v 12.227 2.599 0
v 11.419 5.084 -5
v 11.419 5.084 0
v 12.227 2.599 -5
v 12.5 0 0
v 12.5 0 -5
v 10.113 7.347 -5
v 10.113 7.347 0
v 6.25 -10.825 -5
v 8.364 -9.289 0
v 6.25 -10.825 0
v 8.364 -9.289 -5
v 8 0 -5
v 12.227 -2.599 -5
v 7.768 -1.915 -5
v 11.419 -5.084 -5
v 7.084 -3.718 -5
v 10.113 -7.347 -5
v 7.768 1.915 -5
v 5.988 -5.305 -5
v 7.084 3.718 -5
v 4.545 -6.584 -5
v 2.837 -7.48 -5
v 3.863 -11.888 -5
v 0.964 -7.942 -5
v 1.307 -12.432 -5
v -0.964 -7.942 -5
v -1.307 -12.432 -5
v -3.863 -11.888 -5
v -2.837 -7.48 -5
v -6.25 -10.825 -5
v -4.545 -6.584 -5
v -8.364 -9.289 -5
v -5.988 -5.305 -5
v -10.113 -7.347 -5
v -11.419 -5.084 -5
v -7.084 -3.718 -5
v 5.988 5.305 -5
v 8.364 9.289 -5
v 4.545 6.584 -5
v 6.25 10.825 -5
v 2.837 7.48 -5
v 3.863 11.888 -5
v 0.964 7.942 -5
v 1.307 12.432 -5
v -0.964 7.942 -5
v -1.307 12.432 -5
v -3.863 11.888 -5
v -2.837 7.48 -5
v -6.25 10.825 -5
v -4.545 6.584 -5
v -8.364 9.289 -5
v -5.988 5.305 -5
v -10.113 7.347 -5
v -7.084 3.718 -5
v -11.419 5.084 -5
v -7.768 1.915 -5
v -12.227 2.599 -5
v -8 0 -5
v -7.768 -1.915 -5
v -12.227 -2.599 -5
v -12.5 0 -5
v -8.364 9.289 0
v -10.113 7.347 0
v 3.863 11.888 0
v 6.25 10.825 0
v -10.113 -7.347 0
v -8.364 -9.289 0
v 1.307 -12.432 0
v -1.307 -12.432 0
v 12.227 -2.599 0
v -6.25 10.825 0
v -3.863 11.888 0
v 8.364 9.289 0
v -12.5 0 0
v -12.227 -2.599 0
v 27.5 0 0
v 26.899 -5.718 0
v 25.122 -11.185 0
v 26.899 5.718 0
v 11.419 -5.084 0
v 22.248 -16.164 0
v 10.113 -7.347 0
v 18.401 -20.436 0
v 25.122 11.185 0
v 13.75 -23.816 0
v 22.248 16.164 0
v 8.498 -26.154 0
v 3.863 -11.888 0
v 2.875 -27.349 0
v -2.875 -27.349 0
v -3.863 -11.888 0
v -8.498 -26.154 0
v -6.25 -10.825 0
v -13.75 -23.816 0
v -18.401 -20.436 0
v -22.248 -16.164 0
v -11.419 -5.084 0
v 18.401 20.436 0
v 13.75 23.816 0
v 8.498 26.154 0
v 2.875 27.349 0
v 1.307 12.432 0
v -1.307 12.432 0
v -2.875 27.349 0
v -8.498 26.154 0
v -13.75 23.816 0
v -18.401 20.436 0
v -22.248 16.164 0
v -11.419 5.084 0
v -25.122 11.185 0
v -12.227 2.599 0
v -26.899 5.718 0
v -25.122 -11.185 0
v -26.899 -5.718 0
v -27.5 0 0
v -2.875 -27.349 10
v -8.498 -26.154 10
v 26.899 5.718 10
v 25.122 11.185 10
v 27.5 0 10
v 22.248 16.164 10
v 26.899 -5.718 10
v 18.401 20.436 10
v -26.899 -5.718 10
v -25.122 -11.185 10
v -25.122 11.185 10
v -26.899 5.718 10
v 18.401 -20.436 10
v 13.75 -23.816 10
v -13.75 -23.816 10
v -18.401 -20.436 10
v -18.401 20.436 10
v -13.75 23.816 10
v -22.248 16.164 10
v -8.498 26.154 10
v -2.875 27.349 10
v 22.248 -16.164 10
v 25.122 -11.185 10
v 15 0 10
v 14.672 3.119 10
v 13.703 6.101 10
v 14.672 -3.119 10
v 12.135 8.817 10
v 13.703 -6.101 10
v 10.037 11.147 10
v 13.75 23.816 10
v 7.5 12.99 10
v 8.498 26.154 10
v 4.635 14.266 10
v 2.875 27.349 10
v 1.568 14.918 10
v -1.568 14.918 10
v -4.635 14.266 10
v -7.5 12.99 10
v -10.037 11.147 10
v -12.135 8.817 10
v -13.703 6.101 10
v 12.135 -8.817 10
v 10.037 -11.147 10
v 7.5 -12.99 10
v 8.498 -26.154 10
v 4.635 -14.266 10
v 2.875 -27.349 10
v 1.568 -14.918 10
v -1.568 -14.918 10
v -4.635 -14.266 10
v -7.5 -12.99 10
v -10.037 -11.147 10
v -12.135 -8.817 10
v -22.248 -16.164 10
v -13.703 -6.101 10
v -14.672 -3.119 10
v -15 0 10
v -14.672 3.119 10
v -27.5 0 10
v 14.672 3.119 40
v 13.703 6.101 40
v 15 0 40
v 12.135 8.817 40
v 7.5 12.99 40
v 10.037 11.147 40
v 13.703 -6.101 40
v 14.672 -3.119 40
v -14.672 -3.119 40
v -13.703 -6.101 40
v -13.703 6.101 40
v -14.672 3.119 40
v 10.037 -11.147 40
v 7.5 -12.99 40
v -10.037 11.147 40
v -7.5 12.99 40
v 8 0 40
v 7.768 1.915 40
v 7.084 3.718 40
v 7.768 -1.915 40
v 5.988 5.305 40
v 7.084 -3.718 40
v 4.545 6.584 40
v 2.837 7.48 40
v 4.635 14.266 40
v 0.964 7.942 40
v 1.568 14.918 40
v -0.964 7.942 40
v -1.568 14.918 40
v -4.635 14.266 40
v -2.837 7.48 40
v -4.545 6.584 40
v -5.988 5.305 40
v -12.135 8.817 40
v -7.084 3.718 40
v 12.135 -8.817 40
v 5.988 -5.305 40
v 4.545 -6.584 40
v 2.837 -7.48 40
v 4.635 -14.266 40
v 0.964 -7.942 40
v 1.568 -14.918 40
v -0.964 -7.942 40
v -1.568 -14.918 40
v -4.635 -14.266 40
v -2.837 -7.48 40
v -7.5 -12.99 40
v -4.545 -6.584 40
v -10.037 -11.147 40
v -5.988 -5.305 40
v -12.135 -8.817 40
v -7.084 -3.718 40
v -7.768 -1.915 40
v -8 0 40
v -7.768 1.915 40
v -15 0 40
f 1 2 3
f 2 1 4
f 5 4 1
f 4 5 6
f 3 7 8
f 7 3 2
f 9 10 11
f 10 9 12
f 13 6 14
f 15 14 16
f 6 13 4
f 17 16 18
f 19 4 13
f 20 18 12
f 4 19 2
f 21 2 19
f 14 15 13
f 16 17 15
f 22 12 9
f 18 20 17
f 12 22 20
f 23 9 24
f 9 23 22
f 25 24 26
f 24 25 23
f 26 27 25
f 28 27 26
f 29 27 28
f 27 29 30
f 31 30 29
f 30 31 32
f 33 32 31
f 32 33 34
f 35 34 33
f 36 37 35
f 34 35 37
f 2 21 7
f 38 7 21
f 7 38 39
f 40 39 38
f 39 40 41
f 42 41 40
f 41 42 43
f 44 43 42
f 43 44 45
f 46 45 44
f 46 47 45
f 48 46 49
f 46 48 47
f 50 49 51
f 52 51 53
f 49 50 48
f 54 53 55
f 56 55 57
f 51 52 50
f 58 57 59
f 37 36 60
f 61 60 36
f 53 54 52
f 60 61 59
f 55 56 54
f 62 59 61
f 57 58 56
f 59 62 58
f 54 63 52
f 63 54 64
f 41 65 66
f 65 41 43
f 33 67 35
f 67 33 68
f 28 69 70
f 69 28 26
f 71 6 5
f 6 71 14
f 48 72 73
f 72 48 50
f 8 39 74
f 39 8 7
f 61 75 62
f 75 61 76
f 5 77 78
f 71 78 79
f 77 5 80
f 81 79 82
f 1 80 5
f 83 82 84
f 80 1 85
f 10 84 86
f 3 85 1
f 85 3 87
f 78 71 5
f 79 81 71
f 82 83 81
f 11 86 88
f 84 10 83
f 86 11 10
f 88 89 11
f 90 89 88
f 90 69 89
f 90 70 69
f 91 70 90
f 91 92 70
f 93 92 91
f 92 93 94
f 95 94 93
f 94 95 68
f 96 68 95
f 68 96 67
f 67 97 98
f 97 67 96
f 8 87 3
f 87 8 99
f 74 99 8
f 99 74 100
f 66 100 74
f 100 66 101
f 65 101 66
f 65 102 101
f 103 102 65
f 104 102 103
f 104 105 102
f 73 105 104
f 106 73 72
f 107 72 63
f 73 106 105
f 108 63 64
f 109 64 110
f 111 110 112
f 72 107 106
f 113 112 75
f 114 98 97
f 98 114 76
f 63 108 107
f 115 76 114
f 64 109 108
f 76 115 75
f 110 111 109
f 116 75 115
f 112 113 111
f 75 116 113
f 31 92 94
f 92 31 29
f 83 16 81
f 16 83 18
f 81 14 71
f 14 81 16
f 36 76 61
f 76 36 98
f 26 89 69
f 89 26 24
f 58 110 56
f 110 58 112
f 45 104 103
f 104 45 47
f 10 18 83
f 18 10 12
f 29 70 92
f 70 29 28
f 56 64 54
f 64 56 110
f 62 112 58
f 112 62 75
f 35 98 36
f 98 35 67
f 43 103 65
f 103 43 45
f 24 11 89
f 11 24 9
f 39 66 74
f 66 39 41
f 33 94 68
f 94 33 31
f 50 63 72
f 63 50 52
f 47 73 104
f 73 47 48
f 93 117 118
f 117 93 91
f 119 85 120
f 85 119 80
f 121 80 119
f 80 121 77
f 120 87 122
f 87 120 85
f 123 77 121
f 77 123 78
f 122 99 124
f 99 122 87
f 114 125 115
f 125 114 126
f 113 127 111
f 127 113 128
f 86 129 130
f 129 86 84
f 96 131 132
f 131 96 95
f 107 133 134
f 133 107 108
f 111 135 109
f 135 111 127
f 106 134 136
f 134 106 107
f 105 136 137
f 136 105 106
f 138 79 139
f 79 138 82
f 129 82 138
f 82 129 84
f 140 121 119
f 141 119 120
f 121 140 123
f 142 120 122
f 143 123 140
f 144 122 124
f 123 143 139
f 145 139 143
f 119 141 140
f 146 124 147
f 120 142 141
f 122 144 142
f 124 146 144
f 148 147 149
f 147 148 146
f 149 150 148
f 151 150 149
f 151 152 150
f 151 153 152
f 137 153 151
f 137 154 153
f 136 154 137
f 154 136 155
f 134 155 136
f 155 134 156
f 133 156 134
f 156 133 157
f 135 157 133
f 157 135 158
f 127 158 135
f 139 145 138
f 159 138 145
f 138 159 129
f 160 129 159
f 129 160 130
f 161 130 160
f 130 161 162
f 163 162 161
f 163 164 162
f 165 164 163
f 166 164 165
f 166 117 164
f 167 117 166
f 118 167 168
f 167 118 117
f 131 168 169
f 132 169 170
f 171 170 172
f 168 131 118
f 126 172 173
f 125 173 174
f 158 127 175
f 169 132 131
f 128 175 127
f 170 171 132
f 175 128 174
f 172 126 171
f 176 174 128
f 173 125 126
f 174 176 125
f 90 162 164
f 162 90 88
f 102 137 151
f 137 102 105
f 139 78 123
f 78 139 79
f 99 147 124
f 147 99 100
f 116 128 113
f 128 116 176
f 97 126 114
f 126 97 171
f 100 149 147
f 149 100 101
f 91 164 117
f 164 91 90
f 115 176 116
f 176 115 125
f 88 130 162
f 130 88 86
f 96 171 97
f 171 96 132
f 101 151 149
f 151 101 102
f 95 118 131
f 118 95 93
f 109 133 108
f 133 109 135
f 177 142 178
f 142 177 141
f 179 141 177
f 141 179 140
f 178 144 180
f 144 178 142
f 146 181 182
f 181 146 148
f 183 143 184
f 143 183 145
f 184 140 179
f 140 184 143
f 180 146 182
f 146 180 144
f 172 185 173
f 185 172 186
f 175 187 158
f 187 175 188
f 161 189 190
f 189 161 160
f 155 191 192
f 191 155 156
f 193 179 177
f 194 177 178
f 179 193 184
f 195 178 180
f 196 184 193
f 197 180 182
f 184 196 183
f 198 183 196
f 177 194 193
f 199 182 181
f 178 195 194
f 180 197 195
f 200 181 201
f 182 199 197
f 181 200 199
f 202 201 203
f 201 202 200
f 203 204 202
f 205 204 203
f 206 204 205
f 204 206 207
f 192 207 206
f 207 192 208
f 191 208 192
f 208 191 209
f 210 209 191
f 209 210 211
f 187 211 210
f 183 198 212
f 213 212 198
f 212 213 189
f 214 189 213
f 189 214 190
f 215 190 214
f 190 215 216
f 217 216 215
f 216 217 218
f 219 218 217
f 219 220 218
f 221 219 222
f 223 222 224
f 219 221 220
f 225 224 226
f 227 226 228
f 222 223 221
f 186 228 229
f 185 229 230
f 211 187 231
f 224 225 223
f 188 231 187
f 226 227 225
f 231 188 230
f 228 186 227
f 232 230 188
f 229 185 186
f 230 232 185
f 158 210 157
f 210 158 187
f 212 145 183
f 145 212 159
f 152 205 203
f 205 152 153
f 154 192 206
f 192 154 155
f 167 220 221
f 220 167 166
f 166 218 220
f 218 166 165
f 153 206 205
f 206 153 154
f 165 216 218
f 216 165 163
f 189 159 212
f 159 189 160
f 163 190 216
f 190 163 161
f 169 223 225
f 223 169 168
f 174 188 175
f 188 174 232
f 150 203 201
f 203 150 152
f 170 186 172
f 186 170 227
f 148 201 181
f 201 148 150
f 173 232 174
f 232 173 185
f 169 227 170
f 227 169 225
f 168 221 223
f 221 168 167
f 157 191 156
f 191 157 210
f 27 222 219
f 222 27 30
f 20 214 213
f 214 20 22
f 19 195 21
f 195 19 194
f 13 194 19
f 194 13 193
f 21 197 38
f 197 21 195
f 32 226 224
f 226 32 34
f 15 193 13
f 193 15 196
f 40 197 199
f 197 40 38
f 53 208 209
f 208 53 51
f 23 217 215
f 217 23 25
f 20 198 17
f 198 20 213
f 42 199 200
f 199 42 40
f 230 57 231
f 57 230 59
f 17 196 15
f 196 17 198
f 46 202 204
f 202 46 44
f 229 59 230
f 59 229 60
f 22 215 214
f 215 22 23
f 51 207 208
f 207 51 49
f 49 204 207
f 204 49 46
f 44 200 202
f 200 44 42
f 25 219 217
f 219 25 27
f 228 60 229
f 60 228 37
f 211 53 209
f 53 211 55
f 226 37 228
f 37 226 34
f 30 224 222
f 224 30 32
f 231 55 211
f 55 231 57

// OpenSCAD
// file: ../../../../../primitives/assembly_instruction.scad
module AssemblyInstruction(part, instruction)
{
  echo("assembly_instruction", part, instruction);
}
// file: ../../../../../dimensions.scad
axle_diameter = 16;

box_section_outer = [25, 25];

outer = 210;
inner = 120;

outer_length = 775;
inner_length = 1000;

wheel_centre_distance = 600;
// main file
include <../../../../../dimensions.scad>;

use <../../../../../primitives/assembly_instruction.scad>;

disc_lip_width = 5;
disc_lip_diameter = 25;

disc_face_width = 10;
disc_face_diameter = 55;

axle_clamp_width = 40;
axle_clamp_diameter = 30;

module AxleMount()
{
  difference()
  {
    union()
    {
      translate([0, 0, -disc_lip_width])
      {
        cylinder(d=disc_lip_diameter, h=disc_lip_width);
      }

      AssemblyInstruction(
          "disc_face_plate",
          "drill and tap holes for brake disc mounting as appropriate");
      cylinder(d=disc_face_diameter, h=disc_face_width);

      AssemblyInstruction(
          "axle_clamp",
          "drill and tap holes for axle key screws as appropriate");
      cylinder(d=axle_clamp_diameter, h=axle_clamp_width);
    }

    /* Axle hole */
    cylinder(d=axle_diameter, h=100, center=true);
  }
}

AxleMount();
